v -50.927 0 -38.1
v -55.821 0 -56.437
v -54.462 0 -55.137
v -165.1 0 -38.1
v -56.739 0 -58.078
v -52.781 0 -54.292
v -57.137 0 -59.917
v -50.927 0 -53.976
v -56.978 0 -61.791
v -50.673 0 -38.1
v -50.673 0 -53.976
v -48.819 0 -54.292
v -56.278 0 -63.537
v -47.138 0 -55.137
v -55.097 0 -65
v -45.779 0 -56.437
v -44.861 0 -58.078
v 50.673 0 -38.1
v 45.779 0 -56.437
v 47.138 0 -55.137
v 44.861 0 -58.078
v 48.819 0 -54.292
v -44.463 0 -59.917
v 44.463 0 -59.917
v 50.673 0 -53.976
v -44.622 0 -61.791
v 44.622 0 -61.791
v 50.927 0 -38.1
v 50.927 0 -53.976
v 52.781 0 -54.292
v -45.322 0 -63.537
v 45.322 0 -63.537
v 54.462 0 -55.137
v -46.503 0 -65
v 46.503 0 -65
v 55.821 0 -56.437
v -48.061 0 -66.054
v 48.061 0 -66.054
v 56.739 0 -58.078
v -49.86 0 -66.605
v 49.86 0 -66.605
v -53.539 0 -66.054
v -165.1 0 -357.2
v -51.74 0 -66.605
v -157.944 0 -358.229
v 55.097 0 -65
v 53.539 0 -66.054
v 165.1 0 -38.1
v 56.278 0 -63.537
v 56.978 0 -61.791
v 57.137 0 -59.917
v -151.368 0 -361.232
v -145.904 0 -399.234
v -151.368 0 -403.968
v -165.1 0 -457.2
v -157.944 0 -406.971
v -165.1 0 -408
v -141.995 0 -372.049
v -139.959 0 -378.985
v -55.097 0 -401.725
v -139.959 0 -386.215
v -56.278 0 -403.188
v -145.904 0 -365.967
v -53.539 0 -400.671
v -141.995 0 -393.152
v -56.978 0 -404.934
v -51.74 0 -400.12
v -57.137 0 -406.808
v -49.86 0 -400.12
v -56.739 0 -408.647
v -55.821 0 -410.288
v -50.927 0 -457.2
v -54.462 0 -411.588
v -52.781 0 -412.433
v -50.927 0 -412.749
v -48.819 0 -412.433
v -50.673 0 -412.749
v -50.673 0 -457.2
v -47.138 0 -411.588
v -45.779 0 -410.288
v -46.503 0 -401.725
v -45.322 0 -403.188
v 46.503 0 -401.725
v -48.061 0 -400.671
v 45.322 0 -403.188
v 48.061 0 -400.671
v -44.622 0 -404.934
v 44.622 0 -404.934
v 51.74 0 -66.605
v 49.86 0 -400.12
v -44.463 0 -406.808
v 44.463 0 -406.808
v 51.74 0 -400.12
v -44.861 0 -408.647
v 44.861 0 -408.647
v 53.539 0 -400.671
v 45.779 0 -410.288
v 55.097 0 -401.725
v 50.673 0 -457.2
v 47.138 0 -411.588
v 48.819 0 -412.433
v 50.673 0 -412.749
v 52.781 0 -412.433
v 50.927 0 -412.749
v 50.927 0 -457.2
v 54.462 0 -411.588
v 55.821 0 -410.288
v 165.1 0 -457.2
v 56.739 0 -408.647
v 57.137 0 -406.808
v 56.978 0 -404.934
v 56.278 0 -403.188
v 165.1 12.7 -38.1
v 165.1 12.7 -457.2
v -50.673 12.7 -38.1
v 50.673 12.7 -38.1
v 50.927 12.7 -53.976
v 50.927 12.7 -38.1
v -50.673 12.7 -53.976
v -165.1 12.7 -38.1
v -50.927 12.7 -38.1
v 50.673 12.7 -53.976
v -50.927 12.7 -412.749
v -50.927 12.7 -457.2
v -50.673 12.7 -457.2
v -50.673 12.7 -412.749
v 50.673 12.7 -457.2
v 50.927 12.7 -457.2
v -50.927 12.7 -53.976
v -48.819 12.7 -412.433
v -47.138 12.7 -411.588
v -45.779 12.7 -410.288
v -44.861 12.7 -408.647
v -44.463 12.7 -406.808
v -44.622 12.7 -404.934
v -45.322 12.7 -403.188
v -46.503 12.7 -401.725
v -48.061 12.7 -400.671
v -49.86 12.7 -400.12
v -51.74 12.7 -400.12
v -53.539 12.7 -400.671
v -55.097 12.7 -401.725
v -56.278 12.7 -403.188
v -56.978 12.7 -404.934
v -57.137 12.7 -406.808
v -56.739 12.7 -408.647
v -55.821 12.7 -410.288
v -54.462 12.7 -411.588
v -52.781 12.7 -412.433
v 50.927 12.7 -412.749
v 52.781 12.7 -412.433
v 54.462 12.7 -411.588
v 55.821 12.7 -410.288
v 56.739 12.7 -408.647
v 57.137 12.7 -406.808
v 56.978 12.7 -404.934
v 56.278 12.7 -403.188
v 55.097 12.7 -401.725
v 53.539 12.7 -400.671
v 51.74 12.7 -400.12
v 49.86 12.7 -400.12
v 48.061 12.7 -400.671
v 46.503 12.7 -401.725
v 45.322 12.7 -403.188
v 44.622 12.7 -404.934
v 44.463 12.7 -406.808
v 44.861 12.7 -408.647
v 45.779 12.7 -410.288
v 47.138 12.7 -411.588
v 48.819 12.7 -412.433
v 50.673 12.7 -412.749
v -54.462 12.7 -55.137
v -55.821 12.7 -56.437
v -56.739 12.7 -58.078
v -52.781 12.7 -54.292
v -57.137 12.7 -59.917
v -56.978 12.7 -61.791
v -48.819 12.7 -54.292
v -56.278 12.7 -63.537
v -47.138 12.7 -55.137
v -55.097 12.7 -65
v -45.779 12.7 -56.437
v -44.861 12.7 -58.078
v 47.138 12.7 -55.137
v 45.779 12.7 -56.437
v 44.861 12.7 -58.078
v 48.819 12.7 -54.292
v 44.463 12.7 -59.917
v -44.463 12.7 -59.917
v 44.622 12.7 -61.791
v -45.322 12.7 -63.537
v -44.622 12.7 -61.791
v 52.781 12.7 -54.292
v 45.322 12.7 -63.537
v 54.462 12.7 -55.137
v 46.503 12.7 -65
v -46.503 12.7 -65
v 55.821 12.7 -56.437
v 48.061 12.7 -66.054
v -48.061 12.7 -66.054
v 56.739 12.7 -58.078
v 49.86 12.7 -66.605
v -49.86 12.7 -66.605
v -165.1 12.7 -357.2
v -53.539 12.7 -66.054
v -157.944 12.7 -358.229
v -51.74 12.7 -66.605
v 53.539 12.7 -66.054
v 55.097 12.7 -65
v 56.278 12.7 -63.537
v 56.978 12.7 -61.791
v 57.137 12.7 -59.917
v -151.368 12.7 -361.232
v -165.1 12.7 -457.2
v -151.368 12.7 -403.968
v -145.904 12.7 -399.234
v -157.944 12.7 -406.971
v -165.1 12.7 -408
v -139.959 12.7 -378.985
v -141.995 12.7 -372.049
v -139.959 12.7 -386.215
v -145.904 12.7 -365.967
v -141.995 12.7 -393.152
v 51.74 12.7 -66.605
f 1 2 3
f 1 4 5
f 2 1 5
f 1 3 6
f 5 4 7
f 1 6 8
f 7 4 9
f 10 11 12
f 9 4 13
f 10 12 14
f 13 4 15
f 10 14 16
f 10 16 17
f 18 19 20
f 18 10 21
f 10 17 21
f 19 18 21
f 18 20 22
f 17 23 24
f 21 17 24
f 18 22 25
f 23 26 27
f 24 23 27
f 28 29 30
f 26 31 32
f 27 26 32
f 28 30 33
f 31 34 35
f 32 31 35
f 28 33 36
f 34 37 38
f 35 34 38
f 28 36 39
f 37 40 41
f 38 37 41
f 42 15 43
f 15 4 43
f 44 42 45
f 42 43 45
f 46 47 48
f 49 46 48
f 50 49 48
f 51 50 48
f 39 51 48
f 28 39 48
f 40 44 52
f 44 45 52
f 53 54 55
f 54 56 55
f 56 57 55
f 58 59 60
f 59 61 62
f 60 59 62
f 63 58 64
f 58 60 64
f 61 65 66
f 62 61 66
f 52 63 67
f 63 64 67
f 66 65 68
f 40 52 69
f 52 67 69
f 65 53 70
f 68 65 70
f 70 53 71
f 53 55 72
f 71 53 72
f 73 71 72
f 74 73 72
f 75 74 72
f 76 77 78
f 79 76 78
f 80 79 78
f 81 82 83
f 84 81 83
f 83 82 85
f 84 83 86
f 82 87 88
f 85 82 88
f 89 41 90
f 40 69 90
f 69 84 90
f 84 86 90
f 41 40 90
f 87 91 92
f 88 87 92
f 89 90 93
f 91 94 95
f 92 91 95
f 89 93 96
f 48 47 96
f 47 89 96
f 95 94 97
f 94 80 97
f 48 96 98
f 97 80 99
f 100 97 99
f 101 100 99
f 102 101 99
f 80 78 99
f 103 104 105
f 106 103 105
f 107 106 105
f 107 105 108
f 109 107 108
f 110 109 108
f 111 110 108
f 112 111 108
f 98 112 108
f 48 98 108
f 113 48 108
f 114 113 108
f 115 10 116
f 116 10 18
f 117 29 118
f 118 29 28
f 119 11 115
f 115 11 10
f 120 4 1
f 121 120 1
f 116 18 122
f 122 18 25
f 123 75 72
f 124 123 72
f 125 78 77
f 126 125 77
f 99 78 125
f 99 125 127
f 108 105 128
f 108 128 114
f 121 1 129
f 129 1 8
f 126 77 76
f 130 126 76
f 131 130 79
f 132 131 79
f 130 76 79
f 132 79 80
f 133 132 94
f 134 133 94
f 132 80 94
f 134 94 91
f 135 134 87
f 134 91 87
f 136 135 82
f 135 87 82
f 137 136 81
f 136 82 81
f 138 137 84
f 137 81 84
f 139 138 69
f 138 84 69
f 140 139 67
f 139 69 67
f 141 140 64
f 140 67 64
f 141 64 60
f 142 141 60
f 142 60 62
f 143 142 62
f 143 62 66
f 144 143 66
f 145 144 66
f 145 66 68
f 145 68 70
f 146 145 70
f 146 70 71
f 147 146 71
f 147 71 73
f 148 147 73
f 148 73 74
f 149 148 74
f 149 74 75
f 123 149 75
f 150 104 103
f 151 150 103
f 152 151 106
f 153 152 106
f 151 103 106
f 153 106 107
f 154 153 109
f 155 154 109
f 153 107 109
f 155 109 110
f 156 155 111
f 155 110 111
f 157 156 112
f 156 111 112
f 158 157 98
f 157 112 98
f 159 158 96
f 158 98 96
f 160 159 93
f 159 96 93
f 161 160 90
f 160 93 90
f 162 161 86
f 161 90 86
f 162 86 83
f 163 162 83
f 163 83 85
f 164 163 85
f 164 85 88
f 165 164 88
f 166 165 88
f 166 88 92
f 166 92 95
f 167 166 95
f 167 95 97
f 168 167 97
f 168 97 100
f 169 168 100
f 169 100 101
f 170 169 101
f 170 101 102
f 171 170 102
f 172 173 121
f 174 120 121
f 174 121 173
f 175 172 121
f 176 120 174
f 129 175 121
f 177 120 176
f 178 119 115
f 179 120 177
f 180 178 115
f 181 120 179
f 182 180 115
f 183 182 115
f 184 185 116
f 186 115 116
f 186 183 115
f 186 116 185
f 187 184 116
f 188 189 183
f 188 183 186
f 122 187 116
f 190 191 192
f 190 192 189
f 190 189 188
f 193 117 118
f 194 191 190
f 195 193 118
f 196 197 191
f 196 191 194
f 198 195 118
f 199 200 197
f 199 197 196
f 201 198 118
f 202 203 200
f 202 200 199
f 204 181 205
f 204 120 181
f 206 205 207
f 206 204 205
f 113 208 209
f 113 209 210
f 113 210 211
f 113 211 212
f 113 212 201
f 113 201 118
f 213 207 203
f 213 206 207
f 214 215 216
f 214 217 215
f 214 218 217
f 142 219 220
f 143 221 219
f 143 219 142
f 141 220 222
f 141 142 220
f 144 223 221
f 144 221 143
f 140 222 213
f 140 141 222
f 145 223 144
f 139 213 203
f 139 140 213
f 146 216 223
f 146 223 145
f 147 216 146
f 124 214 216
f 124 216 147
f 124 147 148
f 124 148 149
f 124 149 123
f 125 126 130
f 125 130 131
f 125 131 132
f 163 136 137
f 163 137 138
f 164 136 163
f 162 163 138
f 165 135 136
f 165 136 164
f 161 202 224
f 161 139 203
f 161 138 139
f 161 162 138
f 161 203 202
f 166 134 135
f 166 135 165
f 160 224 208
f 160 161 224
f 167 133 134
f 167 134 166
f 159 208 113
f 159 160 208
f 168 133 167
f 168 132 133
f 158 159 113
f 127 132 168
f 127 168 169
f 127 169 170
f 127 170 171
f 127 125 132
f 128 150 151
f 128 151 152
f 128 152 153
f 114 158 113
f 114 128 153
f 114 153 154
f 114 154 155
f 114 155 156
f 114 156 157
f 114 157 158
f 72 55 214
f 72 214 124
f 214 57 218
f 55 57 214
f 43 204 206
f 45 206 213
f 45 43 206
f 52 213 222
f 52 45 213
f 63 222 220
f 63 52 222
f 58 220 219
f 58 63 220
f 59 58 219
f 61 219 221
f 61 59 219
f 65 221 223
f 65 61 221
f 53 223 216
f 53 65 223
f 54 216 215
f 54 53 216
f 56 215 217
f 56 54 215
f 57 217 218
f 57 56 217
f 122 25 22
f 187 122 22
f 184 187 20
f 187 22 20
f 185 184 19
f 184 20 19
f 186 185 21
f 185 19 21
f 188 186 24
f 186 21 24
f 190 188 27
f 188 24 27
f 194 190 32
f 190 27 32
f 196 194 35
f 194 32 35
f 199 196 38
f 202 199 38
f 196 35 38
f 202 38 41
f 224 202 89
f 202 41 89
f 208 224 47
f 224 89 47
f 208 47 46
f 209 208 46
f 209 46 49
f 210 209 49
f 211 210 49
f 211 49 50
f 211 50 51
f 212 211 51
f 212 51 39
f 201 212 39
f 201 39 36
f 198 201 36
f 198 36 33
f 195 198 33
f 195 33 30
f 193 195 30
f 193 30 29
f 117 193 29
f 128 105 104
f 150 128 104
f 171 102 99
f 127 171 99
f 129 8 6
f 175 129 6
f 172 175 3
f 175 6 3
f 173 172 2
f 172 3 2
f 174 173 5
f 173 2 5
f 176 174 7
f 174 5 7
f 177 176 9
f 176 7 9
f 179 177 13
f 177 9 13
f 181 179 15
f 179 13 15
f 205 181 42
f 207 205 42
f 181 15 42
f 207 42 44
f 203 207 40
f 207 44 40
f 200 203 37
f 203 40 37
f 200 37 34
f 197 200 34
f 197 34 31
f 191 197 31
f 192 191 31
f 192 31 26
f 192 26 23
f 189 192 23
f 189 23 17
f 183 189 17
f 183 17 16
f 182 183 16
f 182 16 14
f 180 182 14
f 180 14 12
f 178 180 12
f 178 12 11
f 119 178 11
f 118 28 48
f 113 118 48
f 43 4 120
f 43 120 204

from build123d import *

# Parameters (mm, degrees)
SKETCH2_W          = 330.2
SKETCH2_H          = 431.8
EXTRUDE2_DEPTH     = 12.7
SKETCH3_W          = 463.121935294
SKETCH3_H          = 86.735895098
CUT_EXTRUDE1_DEPTH = 487.262418865
SKETCH4_R          = 25.4
CUT_EXTRUDE2_DEPTH = 487.262418865
CUT_EXTRUDE3_DEPTH = 487.262418865


with BuildPart() as part:
    # Sketch2 → Extrude2 (new body)
    with BuildSketch(Plane(origin=(0, 0, 0), x_dir=(1, 0, 0), z_dir=(0, 1, 0))):
        with Locations((0, 241.3)):
            Rectangle(SKETCH2_W, SKETCH2_H)
    extrude(amount=EXTRUDE2_DEPTH)

    # Sketch3 → Cut-Extrude1 (cut, through all)
    with BuildSketch(Plane(origin=(0, 0, 0), x_dir=(1, 0, 0), z_dir=(0, 1, 0))):
        with Locations((0, -5.267947549)):
            Rectangle(SKETCH3_W, SKETCH3_H)
    extrude(amount=CUT_EXTRUDE1_DEPTH, mode=Mode.SUBTRACT)

    # Sketch4 → Cut-Extrude2 (cut, through all)
    with BuildSketch(Plane(origin=(0, 0, 0), x_dir=(1, 0, 0), z_dir=(0, 1, 0))):
        with Locations((-165.1, 382.6002)):
            Circle(SKETCH4_R)
    extrude(amount=CUT_EXTRUDE2_DEPTH, mode=Mode.SUBTRACT)

    # Sketch5 → Cut-Extrude3 (cut, through all)
    with BuildSketch(Plane(origin=(0, 0, 0), x_dir=(1, 0, 0), z_dir=(0, 1, 0))):
        with BuildLine():
            Line((-50.927, 495.604822125), (-50.673, 495.604822125))
            Line((-50.673, 495.604822125), (-50.673, 412.748729873))
            ThreePointArc((-50.673, 412.748729873), (-50.8, 400.05), (-50.927, 412.748729873))
            Line((-50.927, 412.748729873), (-50.927, 495.604822125))
        make_face()
        with BuildLine():
            Line((50.673, 497.366900496), (50.927, 497.366900496))
            Line((50.927, 497.366900496), (50.927, 412.748729873))
            ThreePointArc((50.927, 412.748729873), (50.8, 400.05), (50.673, 412.748729873))
            Line((50.673, 412.748729873), (50.673, 497.366900496))
        make_face()
        with BuildLine():
            Line((-50.673, 53.976270127), (-50.673, 30.44578085))
            Line((-50.673, 30.44578085), (-50.927, 30.44578085))
            Line((-50.927, 30.44578085), (-50.927, 53.976270127))
            ThreePointArc((-50.927, 53.976270127), (-50.8, 66.675), (-50.673, 53.976270127))
        make_face()
        with BuildLine():
            Line((50.927, 53.976270127), (50.927, 31.394028455))
            Line((50.927, 31.394028455), (50.673, 31.394028455))
            Line((50.673, 31.394028455), (50.673, 53.976270127))
            ThreePointArc((50.673, 53.976270127), (50.8, 66.675), (50.927, 53.976270127))
        make_face()
    extrude(amount=CUT_EXTRUDE3_DEPTH, mode=Mode.SUBTRACT)


solid = part.part
